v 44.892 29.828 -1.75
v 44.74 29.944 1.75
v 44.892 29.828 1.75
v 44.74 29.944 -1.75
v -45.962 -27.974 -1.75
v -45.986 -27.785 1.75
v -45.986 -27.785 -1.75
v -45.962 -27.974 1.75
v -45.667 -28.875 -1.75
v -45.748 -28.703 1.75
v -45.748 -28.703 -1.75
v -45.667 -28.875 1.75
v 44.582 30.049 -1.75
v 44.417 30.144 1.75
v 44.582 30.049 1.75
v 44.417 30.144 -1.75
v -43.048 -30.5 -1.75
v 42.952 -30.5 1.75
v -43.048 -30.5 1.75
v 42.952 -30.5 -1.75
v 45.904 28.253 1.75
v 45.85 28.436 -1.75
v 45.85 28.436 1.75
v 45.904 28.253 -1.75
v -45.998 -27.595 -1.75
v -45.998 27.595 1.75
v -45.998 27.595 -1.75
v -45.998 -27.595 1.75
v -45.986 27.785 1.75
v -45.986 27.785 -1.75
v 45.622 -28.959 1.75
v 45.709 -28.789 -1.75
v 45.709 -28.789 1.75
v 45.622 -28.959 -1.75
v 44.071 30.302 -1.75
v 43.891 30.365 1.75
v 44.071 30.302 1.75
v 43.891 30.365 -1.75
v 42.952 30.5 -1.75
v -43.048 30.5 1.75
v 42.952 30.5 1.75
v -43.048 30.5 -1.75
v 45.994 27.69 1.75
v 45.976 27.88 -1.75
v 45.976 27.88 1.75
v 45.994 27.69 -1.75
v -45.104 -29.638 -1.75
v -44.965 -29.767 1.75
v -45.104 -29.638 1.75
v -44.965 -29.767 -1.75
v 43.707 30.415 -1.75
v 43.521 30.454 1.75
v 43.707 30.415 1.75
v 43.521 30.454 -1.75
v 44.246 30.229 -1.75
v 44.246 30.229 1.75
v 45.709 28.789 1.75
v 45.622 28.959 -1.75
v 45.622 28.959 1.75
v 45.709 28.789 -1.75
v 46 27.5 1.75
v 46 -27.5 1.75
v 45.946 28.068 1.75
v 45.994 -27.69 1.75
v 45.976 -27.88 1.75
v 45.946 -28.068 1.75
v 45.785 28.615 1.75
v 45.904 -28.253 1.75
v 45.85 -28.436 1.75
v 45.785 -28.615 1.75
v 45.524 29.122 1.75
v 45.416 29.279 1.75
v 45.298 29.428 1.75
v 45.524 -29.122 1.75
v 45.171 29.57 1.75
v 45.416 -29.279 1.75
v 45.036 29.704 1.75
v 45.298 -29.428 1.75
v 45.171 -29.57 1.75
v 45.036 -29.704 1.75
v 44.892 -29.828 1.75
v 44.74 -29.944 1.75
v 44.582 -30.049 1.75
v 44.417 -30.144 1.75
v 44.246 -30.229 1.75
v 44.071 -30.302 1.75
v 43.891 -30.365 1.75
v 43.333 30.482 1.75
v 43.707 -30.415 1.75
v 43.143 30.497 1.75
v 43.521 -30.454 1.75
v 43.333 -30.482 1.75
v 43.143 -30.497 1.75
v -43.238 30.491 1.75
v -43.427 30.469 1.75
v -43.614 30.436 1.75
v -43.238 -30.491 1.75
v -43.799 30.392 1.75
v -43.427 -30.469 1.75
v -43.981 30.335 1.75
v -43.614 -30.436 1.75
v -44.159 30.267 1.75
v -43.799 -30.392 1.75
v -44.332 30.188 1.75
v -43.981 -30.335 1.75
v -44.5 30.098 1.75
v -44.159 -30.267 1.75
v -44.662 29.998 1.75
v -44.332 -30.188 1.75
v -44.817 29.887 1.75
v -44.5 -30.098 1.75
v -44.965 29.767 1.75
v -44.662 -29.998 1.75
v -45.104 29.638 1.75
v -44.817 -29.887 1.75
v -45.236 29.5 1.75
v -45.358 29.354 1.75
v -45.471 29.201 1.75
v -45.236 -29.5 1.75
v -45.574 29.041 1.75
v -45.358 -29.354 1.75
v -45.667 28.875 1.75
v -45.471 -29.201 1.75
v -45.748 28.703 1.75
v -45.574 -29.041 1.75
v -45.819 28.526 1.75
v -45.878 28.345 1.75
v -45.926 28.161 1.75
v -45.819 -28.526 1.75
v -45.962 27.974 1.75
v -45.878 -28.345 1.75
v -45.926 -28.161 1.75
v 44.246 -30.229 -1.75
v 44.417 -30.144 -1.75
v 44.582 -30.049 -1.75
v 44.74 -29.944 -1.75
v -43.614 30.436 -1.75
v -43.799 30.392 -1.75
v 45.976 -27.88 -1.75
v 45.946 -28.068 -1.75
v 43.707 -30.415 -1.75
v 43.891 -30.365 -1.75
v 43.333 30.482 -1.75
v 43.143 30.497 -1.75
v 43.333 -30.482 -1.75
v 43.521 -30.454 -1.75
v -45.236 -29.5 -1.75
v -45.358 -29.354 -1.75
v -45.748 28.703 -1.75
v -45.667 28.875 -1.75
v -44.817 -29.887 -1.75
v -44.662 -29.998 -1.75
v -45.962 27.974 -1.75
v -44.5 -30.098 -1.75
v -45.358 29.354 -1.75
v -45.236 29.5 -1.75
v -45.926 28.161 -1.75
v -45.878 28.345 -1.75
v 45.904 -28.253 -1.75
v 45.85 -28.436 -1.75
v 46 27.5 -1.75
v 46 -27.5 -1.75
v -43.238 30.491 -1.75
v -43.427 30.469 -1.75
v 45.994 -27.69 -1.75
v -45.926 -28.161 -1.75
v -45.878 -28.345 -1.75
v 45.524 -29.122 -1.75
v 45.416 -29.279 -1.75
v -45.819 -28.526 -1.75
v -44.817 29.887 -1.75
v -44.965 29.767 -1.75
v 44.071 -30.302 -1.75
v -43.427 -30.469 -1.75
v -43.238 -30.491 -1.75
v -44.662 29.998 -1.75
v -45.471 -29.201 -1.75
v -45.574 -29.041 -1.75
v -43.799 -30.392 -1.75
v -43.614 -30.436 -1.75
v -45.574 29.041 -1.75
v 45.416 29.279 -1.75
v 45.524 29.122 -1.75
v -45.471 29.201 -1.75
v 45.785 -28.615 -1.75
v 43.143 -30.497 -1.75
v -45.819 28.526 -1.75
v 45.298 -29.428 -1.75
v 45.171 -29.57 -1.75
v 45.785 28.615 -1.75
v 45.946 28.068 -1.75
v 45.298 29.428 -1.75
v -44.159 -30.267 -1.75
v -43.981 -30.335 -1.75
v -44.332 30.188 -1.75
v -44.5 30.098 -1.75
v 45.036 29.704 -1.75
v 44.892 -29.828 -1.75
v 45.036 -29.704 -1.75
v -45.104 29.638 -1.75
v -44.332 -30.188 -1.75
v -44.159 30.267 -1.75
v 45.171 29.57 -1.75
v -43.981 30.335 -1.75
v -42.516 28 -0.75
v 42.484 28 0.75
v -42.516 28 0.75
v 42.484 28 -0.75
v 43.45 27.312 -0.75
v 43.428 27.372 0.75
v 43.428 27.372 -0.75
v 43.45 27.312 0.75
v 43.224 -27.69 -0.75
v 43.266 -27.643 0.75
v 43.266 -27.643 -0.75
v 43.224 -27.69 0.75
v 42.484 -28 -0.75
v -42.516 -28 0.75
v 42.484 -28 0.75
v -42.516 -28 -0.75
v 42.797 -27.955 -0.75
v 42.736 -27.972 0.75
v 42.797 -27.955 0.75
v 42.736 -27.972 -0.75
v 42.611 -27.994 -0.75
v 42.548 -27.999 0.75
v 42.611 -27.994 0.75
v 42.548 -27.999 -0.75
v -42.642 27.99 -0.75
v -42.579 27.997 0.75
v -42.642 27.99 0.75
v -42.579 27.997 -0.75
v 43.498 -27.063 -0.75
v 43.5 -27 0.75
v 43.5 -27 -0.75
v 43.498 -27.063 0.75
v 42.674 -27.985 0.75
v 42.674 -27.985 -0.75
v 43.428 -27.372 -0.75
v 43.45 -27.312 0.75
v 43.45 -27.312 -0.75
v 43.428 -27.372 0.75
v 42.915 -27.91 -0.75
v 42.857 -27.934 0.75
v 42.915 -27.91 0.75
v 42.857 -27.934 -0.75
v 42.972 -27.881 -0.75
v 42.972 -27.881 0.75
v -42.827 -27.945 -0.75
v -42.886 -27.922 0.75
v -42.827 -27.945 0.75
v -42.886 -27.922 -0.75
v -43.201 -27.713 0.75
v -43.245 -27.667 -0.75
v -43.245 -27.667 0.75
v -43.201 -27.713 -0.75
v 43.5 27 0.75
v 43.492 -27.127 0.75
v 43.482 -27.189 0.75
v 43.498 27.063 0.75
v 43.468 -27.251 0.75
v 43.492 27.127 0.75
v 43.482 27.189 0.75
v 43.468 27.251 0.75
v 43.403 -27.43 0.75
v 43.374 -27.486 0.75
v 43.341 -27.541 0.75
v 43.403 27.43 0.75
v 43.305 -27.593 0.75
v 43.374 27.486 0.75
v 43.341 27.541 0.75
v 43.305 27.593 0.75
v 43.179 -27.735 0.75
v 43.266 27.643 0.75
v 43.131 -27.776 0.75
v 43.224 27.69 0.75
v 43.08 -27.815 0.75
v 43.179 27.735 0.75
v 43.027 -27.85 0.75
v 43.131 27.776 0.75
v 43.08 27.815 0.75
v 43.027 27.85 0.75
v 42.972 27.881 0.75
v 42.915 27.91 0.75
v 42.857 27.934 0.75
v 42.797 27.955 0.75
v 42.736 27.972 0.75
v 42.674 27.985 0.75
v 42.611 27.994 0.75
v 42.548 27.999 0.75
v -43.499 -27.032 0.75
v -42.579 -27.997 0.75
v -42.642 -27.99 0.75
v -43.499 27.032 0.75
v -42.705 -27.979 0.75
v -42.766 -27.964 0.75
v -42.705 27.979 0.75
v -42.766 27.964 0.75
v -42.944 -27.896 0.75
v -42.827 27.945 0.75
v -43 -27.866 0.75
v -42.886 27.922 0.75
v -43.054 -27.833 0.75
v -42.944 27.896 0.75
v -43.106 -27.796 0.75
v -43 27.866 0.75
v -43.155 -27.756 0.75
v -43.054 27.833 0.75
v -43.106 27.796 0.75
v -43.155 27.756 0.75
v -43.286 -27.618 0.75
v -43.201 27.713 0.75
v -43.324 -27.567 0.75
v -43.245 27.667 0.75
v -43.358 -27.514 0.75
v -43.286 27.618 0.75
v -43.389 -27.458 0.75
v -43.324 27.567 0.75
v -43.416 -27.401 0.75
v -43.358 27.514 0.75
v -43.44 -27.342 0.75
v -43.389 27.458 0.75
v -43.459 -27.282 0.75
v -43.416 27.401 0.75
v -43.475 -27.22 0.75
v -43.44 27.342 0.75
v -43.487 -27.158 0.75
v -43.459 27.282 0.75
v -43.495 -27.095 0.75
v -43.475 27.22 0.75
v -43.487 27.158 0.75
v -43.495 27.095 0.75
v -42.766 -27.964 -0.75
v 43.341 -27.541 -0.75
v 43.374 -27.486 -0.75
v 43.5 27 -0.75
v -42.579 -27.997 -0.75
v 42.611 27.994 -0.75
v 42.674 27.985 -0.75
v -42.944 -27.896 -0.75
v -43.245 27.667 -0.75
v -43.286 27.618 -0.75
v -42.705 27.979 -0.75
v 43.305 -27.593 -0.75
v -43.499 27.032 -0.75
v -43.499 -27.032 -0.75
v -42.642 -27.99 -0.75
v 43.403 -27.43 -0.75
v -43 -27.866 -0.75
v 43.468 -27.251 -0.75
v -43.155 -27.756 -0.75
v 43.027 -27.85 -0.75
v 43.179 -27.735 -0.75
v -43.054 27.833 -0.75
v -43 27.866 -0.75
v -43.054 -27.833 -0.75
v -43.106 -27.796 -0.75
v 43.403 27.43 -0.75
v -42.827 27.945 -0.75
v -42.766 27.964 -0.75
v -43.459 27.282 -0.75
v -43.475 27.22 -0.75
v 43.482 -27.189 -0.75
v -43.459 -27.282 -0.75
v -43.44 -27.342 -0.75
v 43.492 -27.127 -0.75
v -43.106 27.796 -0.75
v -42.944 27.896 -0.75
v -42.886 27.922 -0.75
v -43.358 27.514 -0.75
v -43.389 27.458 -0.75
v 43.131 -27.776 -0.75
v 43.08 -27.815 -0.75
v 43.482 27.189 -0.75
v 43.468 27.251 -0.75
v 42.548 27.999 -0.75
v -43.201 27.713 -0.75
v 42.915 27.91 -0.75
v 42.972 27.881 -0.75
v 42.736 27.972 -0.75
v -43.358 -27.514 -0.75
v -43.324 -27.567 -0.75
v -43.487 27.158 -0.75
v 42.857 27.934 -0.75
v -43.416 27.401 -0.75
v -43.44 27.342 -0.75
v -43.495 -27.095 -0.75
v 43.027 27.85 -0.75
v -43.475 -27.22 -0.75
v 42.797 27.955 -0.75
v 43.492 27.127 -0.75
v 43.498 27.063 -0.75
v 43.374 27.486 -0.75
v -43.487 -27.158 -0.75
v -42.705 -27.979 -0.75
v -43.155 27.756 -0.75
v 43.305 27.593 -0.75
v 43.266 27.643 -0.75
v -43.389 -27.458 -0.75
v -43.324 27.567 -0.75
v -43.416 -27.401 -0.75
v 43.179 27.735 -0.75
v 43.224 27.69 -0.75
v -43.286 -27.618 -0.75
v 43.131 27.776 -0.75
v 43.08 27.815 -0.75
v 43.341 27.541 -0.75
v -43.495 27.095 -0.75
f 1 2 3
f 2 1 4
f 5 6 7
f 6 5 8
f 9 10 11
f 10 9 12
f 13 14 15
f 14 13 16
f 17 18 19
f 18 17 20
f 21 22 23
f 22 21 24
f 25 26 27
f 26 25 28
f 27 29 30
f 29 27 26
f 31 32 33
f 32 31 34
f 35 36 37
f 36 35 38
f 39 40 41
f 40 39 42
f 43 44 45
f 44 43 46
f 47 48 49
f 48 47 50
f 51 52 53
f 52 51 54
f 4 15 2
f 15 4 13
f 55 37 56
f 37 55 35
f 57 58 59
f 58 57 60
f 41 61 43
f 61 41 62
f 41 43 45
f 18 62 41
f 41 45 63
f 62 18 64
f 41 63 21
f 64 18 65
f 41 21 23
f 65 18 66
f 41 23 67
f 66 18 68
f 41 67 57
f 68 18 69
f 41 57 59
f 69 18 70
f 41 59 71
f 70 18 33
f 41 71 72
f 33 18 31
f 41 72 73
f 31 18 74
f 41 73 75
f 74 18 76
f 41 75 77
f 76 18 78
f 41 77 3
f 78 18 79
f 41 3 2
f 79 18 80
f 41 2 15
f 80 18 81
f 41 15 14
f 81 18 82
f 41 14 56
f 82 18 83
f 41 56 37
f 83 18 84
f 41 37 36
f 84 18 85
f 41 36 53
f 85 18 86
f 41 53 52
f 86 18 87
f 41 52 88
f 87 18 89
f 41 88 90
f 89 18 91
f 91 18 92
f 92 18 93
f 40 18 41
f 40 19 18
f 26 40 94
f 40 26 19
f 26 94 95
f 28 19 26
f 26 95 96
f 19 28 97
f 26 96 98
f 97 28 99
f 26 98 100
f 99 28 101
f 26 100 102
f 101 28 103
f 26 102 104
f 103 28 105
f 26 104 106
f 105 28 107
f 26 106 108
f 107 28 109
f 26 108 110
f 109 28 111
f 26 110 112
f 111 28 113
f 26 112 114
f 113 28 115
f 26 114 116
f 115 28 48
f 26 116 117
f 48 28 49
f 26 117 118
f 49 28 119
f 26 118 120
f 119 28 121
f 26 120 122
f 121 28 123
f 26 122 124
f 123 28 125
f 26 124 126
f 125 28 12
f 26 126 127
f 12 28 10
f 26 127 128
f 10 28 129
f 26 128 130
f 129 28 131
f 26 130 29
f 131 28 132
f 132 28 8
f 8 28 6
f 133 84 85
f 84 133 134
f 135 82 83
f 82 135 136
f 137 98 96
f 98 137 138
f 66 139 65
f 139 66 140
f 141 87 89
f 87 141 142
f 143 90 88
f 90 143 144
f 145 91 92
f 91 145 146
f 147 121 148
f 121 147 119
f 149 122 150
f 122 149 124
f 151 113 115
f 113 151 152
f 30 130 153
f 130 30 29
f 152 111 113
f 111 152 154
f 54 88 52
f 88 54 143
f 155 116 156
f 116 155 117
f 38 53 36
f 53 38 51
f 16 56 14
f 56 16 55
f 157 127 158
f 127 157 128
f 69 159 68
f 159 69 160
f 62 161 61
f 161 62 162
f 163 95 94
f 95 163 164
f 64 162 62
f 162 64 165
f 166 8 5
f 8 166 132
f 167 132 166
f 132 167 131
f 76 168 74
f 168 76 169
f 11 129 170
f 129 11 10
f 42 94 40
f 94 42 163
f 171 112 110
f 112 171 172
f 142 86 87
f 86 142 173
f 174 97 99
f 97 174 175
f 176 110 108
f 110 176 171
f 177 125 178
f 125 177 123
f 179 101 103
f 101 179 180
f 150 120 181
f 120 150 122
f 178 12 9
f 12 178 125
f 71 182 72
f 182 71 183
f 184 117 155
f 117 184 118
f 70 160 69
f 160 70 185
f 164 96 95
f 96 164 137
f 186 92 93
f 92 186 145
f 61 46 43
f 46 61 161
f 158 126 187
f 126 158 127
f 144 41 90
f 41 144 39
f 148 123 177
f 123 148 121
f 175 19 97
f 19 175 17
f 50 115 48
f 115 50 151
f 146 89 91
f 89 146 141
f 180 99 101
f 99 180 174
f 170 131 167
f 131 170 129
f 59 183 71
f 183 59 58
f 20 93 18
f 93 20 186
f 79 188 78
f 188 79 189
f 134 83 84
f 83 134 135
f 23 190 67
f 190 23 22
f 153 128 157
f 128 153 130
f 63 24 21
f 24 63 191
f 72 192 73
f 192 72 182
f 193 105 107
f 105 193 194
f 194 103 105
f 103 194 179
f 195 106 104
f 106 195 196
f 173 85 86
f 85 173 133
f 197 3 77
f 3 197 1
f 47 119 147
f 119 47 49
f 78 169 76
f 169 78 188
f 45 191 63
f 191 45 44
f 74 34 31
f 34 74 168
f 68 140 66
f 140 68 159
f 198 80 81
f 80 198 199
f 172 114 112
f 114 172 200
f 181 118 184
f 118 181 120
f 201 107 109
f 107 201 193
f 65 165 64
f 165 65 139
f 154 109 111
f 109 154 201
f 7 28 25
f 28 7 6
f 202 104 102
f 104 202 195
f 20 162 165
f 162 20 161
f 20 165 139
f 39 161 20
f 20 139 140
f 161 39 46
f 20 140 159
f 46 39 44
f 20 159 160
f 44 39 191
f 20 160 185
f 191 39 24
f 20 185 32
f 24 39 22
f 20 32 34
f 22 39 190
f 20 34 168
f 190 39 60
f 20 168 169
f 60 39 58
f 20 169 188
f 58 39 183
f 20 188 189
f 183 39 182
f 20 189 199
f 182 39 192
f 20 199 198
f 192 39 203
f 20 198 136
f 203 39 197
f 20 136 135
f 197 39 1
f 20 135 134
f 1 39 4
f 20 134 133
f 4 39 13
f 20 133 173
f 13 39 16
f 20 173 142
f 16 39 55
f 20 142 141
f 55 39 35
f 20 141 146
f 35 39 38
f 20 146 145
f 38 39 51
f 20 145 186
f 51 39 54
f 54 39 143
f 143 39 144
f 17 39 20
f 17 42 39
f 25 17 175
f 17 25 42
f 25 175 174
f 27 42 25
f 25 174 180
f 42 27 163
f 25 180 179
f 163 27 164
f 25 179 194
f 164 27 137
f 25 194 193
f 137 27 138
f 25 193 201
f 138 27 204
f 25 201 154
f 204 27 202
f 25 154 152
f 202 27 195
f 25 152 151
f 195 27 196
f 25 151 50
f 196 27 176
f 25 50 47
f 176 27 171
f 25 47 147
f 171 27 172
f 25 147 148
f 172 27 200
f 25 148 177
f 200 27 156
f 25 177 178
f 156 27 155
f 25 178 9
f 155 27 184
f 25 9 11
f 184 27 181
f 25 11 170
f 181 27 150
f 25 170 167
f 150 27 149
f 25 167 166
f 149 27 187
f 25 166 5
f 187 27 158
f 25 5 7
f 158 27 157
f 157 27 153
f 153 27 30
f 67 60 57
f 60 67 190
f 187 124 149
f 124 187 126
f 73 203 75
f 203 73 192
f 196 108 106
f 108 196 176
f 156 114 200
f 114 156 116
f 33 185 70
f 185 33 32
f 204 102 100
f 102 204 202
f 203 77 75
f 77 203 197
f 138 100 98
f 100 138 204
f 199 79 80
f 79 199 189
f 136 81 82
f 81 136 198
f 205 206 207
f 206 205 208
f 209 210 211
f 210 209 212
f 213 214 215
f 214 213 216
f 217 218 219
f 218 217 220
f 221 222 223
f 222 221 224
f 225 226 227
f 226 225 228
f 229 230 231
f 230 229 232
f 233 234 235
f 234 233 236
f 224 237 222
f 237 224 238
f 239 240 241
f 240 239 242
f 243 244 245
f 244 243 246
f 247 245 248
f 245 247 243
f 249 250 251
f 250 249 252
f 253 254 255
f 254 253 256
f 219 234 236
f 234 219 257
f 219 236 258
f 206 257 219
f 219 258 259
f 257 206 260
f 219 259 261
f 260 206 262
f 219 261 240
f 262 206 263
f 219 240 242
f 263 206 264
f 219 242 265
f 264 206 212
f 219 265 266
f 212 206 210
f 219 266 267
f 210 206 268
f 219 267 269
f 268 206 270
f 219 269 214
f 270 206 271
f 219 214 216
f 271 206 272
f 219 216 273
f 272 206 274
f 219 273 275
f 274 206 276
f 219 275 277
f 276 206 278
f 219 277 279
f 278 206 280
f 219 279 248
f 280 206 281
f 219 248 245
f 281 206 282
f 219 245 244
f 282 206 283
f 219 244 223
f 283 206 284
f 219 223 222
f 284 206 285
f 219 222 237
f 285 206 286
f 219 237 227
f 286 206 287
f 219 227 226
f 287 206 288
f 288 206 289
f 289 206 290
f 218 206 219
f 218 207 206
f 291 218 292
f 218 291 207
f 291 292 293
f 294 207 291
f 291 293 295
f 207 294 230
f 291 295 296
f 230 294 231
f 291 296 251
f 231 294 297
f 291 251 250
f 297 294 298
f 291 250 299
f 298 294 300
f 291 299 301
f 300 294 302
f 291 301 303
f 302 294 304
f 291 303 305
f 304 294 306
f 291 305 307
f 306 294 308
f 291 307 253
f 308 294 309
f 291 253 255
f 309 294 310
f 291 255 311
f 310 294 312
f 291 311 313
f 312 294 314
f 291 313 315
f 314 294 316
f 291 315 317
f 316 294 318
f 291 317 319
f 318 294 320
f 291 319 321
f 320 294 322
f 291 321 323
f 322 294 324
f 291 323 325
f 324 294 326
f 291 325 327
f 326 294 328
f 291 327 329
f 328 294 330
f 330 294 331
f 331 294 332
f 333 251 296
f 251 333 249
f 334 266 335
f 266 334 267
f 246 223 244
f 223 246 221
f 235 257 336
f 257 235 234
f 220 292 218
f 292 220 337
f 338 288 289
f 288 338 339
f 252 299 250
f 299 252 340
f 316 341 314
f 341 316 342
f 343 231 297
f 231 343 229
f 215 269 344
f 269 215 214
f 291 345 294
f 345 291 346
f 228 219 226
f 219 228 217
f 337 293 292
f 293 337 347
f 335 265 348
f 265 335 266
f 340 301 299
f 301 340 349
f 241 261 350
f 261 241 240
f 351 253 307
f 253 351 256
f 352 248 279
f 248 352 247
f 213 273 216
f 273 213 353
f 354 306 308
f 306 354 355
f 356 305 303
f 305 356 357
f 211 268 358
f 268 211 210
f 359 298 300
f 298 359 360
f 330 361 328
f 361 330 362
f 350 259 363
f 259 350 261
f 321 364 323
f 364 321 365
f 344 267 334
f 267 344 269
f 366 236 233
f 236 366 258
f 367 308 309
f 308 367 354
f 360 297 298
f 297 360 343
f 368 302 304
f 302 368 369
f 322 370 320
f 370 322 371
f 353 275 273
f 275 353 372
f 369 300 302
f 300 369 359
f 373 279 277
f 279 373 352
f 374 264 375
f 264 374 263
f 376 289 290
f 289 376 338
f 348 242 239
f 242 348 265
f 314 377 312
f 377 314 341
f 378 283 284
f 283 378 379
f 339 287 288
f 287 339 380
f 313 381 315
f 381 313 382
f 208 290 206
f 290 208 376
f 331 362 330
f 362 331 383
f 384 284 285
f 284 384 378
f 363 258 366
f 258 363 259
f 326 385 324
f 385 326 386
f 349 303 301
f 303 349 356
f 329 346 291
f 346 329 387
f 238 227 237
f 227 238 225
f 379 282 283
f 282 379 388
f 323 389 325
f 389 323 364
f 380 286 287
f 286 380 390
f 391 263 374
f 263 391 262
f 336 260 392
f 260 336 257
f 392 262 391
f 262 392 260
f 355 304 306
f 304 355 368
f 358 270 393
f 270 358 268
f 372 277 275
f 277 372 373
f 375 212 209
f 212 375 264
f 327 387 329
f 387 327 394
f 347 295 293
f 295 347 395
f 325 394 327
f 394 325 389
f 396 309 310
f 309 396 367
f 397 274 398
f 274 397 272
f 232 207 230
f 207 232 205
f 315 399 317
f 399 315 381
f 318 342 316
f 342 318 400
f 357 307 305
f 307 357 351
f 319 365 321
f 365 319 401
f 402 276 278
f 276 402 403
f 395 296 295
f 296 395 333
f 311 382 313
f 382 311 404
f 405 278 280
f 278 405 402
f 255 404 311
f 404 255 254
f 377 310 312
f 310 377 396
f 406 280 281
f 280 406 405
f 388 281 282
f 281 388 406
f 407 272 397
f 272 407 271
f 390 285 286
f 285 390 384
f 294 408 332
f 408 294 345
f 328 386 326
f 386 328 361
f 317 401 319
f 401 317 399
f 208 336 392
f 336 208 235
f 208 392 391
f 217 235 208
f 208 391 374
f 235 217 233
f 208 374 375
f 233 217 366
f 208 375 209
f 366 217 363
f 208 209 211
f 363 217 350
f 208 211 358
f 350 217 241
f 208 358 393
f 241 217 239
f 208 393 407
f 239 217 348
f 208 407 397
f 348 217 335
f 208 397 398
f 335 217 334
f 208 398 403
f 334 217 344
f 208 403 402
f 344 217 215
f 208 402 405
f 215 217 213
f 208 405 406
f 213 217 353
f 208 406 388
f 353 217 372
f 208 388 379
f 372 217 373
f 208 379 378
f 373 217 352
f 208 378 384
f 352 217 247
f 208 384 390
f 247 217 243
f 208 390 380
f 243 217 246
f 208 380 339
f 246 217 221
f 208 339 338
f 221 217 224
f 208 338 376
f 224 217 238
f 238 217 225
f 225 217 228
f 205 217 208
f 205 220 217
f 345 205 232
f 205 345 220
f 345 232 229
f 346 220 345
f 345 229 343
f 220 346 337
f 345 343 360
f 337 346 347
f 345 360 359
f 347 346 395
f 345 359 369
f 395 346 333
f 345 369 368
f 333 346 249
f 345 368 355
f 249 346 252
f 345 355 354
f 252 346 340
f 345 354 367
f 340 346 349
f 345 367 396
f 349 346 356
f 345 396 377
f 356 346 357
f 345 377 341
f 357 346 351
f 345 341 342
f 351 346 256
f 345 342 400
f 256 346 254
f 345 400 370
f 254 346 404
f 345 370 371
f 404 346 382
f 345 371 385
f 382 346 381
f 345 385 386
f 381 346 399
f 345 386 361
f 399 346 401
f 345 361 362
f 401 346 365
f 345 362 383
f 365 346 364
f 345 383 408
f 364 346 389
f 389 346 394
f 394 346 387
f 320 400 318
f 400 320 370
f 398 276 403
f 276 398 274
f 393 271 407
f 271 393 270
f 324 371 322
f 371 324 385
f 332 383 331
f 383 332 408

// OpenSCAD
$fn = 99;



module cardholder(
    size=[85, 54, 1],
    thickness=3,
    spacing=1,
    cards=4,
    delta=25,
    visibility=0.3) { 
        s = spacing;
        t = thickness;
        xo = size[0];
        yo = size[1];
        zo = size[2];
        x = size[0] + s;
        y = size[1] + s;
        z = size[2] + s;
        xt = x + t;
        yt = y + t;
        zt = z + t;
        
   difference(){    
    color("blue")
    minkowski() {
        cube([x,y,z/2], center=true);
        cylinder(r=t, h=zt/2, center=true);
    }

    color("red")
    minkowski() {
        cube([xo,yo,zo], center=true);
        cylinder(r=s, h=size[2]/2, center=true);
    }
}

}

cardholder();
